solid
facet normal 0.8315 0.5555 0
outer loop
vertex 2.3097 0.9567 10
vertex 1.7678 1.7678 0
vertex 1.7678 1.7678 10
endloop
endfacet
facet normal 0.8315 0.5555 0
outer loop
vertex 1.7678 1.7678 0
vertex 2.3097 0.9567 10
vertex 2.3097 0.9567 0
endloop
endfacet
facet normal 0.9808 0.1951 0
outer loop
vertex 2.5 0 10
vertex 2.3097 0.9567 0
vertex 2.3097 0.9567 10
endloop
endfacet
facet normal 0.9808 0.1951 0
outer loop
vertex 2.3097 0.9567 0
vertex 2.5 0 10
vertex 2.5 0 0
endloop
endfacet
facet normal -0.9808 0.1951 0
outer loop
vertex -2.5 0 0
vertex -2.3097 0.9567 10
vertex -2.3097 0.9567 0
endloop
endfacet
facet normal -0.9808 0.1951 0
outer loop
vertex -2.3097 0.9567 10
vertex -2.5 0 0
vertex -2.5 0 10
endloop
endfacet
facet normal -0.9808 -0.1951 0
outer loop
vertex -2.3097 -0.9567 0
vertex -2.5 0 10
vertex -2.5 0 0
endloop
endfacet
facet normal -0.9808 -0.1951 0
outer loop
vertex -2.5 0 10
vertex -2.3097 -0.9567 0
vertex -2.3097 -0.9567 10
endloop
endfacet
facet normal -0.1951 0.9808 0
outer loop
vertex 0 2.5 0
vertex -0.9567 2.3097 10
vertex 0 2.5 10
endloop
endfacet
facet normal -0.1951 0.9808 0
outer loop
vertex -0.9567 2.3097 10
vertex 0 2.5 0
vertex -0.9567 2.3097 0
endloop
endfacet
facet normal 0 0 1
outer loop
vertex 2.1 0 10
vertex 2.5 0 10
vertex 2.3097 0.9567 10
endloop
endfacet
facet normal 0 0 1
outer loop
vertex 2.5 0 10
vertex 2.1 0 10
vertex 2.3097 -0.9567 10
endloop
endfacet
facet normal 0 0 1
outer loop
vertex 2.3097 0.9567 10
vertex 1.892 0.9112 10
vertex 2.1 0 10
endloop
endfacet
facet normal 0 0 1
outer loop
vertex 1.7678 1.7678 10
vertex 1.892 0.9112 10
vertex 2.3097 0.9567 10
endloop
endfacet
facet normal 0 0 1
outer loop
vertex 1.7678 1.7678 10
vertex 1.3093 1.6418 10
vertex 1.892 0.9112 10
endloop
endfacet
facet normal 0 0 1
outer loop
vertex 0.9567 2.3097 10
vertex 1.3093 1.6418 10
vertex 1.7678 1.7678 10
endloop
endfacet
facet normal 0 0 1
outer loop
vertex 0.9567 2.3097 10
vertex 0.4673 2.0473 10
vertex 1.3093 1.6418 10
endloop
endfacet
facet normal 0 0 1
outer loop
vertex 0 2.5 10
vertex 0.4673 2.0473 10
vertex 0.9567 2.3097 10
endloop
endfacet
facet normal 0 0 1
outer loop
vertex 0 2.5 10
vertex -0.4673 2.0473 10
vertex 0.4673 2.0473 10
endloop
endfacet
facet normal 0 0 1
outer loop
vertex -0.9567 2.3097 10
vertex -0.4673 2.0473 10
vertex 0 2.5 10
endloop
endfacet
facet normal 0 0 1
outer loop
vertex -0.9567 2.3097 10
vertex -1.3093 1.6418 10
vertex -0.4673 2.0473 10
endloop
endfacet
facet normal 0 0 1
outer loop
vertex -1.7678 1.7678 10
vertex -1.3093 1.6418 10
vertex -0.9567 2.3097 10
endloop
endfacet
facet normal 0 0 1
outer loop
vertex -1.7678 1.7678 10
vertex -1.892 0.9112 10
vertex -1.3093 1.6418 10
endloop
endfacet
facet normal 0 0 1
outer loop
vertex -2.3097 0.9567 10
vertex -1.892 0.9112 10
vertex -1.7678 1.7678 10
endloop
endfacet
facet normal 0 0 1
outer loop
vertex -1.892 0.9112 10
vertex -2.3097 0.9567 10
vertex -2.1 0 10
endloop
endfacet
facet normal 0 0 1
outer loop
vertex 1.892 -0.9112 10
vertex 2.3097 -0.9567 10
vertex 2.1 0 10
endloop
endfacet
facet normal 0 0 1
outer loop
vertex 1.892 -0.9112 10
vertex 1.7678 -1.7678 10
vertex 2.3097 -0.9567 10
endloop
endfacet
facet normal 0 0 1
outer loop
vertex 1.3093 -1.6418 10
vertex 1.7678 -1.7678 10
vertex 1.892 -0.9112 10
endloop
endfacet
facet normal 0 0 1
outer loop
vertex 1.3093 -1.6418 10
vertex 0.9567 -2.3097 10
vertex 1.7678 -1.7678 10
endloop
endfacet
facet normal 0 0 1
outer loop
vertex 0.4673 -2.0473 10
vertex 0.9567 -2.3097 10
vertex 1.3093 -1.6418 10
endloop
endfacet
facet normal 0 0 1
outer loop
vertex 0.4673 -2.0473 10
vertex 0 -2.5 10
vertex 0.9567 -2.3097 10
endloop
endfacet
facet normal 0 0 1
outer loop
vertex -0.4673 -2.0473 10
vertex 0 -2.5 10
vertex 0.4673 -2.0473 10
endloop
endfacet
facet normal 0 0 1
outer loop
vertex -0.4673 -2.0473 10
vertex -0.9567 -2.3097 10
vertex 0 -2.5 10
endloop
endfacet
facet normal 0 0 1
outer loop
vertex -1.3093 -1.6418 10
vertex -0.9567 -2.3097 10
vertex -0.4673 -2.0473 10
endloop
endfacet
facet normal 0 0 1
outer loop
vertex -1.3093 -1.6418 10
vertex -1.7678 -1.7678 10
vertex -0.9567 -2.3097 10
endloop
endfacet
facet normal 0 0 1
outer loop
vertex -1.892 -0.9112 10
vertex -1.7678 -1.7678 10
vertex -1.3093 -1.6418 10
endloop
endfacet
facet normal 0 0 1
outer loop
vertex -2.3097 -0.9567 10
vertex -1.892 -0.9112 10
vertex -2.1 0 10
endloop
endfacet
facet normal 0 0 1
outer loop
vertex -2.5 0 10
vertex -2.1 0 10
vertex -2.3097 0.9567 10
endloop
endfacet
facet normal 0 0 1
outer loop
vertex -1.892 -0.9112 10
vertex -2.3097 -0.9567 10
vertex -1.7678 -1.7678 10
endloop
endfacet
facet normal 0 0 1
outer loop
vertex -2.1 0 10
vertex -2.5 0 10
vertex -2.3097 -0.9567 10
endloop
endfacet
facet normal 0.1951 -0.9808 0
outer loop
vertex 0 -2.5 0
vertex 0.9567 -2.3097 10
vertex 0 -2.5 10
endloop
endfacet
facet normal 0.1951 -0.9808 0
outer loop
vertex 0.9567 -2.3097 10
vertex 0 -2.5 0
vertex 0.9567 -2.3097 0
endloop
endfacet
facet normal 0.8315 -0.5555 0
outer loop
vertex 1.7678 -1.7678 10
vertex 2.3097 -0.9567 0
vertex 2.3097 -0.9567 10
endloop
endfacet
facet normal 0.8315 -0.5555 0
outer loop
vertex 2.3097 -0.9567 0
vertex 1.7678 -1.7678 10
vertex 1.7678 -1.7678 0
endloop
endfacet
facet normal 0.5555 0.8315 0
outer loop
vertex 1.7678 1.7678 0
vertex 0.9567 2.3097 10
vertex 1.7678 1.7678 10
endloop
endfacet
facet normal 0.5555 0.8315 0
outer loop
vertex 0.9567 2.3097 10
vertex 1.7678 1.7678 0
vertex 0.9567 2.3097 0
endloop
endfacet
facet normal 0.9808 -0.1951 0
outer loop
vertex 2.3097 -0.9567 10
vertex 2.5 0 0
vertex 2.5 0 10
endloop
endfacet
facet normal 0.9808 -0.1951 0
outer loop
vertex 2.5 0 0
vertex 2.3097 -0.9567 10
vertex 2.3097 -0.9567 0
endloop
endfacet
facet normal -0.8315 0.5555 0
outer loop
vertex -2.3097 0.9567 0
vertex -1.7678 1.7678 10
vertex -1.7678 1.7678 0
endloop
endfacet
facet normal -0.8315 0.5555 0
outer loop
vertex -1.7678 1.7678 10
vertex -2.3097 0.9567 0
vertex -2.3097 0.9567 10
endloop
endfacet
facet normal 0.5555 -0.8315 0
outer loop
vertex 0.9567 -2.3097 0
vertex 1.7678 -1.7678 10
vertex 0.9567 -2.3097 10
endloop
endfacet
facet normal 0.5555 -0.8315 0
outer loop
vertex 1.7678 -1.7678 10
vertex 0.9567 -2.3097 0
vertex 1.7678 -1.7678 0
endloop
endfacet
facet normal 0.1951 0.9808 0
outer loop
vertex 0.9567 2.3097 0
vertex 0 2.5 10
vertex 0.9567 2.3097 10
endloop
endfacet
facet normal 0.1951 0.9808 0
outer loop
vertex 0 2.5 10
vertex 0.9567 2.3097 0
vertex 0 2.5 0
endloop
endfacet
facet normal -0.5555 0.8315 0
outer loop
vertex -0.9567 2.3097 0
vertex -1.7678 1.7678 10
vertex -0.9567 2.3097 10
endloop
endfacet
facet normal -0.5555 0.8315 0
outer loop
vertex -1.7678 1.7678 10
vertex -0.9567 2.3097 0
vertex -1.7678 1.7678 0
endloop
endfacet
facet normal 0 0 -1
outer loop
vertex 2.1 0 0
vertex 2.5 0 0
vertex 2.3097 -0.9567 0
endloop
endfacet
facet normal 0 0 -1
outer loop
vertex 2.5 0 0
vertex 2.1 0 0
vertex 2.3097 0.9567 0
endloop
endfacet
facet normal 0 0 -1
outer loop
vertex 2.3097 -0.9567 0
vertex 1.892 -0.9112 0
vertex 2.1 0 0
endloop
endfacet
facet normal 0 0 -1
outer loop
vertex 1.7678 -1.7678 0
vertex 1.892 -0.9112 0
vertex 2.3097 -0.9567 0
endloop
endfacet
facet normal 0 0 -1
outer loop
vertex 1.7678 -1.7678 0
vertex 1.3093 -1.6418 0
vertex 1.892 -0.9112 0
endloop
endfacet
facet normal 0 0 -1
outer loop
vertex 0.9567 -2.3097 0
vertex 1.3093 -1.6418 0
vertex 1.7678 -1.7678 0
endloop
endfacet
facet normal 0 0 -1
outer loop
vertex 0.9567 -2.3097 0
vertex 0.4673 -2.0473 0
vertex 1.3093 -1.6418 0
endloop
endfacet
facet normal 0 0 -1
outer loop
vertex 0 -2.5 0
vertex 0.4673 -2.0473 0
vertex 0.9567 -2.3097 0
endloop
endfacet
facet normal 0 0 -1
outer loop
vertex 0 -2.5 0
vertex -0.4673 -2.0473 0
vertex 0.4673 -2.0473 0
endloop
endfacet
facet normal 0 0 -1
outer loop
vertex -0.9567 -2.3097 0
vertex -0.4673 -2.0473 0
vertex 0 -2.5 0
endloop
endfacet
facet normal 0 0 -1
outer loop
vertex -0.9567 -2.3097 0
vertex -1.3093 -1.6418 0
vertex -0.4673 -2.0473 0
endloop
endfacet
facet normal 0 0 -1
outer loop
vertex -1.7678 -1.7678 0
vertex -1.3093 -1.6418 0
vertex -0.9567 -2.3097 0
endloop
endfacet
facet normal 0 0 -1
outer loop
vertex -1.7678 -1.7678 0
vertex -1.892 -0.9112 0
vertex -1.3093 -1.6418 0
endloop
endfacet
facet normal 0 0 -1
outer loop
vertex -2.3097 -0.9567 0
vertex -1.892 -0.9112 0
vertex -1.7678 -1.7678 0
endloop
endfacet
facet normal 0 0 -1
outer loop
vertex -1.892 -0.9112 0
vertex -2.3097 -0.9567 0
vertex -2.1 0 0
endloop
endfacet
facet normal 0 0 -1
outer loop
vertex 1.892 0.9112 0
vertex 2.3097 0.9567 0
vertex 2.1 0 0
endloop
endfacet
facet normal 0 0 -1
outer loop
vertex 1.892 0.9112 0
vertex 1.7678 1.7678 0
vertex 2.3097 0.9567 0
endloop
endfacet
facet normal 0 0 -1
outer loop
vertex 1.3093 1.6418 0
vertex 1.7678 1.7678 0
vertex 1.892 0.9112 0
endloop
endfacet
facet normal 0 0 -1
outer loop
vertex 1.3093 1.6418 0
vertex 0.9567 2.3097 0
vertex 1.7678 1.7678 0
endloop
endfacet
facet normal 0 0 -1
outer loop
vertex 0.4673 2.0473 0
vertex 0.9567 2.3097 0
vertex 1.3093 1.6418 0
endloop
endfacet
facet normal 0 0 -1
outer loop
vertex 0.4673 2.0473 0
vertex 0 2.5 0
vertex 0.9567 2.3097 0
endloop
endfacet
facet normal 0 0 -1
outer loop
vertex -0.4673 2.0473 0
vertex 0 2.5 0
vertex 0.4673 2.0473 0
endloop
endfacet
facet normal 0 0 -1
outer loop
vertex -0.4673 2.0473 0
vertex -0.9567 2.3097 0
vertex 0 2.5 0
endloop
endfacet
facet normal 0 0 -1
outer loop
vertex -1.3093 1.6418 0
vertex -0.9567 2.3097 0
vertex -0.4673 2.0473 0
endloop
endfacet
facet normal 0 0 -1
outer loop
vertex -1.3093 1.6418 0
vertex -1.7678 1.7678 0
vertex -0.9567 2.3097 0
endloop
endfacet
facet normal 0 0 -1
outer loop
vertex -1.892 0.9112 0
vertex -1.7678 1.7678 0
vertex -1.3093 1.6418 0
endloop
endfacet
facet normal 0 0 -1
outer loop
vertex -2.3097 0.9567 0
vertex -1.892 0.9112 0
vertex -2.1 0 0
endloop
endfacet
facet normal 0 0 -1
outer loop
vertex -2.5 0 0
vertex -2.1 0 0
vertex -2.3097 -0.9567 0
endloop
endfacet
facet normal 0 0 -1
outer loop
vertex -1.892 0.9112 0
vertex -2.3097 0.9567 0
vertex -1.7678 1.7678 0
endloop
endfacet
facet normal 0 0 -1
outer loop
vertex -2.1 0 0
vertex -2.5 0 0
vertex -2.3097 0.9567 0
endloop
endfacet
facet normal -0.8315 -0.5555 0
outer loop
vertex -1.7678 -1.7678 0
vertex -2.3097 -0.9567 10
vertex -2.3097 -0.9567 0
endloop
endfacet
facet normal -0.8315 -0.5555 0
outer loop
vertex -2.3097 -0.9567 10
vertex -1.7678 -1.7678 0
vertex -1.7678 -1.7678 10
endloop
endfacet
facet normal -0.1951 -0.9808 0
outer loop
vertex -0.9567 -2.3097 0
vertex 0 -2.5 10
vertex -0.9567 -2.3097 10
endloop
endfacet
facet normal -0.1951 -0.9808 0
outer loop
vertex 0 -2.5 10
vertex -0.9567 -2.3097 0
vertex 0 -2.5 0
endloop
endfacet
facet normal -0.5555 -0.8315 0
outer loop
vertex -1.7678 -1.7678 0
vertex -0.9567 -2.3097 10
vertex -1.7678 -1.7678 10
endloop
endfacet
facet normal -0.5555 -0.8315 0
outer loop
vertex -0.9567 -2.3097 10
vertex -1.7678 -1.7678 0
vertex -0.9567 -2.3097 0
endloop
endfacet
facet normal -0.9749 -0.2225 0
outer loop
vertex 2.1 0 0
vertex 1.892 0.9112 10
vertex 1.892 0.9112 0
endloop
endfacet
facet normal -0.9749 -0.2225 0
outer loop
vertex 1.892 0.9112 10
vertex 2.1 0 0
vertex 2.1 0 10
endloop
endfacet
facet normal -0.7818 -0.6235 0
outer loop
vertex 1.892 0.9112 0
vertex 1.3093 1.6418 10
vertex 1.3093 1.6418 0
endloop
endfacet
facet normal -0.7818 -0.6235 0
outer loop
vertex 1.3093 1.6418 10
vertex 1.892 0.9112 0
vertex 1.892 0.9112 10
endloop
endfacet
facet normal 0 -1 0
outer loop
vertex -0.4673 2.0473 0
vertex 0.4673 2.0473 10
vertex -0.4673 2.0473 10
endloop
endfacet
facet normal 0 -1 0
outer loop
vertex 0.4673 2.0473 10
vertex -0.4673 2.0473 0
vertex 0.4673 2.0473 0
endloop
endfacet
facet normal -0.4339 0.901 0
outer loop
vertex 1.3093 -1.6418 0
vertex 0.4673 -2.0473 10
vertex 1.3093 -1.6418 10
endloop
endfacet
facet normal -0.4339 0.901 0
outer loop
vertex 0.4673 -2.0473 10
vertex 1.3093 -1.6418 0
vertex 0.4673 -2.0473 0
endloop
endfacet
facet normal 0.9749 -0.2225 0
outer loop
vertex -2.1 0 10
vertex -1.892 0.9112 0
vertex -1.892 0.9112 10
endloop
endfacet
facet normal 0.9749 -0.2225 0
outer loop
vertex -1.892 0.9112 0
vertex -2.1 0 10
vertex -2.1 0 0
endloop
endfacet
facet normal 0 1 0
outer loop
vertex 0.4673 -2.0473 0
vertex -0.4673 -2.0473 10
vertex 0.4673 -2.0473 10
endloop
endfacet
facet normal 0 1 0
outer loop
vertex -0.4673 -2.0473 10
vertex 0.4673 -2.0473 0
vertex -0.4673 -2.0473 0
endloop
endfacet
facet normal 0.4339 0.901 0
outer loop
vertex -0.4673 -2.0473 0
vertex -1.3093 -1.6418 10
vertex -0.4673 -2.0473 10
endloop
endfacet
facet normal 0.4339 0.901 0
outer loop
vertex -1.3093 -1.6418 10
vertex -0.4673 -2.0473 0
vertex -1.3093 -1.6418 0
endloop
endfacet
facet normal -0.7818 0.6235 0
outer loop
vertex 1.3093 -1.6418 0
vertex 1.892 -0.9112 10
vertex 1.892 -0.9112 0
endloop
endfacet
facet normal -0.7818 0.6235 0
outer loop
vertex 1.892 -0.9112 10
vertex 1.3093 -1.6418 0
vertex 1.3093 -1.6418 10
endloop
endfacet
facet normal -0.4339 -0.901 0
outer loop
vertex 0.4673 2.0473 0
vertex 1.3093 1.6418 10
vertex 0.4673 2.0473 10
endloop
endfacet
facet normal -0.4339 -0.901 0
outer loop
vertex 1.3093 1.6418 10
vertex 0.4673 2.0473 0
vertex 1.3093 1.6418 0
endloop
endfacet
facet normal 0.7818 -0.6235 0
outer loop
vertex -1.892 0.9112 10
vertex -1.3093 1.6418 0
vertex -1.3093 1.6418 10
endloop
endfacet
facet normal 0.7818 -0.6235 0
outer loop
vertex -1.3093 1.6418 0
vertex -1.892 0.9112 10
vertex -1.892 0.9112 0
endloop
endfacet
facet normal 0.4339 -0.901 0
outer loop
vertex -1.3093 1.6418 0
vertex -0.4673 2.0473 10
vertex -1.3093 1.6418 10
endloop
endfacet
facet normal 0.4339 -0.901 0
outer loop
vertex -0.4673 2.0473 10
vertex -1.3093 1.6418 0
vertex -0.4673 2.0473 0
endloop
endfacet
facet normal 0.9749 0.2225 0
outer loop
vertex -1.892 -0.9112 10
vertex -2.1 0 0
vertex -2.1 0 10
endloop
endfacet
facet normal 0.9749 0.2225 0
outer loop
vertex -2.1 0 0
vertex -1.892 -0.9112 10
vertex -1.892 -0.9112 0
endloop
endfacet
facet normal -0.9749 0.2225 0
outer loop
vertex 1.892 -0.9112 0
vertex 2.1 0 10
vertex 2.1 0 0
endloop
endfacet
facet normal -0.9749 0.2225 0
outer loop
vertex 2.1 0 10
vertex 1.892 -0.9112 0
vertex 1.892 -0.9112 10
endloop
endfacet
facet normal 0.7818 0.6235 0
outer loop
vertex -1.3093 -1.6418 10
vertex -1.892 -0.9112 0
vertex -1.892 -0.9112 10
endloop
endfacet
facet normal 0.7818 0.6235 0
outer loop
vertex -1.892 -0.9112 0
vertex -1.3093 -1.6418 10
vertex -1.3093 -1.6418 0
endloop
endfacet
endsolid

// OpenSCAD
// -*- mode: SCAD ; c-file-style: "ellemtel" ; coding: utf-8 -*-
//
// Buchse (bushing)
//
// © 2017 Roland Sieker <ospalh@gmail.com>
// Licence: CC-0 4.0

d_i = 4.2;
d_a = 5;
h = 10;

preview = true;

ms = 0.1;  // Muggeseggele



pa = 5;
ps = 1;
ra = 1;
rs = 0.1;
function na() = (preview) ? pna : rna;
function nb() = (preview) ? pnb : rnb;
$fs = (preview) ? ps : rs;
$fa = (preview) ? pa : ra;



difference()
{
    cylinder(d=d_a, h=h);
    translate([0,0,-ms])
    {
        cylinder(d=d_i, h=h+2*ms);
    }
}
